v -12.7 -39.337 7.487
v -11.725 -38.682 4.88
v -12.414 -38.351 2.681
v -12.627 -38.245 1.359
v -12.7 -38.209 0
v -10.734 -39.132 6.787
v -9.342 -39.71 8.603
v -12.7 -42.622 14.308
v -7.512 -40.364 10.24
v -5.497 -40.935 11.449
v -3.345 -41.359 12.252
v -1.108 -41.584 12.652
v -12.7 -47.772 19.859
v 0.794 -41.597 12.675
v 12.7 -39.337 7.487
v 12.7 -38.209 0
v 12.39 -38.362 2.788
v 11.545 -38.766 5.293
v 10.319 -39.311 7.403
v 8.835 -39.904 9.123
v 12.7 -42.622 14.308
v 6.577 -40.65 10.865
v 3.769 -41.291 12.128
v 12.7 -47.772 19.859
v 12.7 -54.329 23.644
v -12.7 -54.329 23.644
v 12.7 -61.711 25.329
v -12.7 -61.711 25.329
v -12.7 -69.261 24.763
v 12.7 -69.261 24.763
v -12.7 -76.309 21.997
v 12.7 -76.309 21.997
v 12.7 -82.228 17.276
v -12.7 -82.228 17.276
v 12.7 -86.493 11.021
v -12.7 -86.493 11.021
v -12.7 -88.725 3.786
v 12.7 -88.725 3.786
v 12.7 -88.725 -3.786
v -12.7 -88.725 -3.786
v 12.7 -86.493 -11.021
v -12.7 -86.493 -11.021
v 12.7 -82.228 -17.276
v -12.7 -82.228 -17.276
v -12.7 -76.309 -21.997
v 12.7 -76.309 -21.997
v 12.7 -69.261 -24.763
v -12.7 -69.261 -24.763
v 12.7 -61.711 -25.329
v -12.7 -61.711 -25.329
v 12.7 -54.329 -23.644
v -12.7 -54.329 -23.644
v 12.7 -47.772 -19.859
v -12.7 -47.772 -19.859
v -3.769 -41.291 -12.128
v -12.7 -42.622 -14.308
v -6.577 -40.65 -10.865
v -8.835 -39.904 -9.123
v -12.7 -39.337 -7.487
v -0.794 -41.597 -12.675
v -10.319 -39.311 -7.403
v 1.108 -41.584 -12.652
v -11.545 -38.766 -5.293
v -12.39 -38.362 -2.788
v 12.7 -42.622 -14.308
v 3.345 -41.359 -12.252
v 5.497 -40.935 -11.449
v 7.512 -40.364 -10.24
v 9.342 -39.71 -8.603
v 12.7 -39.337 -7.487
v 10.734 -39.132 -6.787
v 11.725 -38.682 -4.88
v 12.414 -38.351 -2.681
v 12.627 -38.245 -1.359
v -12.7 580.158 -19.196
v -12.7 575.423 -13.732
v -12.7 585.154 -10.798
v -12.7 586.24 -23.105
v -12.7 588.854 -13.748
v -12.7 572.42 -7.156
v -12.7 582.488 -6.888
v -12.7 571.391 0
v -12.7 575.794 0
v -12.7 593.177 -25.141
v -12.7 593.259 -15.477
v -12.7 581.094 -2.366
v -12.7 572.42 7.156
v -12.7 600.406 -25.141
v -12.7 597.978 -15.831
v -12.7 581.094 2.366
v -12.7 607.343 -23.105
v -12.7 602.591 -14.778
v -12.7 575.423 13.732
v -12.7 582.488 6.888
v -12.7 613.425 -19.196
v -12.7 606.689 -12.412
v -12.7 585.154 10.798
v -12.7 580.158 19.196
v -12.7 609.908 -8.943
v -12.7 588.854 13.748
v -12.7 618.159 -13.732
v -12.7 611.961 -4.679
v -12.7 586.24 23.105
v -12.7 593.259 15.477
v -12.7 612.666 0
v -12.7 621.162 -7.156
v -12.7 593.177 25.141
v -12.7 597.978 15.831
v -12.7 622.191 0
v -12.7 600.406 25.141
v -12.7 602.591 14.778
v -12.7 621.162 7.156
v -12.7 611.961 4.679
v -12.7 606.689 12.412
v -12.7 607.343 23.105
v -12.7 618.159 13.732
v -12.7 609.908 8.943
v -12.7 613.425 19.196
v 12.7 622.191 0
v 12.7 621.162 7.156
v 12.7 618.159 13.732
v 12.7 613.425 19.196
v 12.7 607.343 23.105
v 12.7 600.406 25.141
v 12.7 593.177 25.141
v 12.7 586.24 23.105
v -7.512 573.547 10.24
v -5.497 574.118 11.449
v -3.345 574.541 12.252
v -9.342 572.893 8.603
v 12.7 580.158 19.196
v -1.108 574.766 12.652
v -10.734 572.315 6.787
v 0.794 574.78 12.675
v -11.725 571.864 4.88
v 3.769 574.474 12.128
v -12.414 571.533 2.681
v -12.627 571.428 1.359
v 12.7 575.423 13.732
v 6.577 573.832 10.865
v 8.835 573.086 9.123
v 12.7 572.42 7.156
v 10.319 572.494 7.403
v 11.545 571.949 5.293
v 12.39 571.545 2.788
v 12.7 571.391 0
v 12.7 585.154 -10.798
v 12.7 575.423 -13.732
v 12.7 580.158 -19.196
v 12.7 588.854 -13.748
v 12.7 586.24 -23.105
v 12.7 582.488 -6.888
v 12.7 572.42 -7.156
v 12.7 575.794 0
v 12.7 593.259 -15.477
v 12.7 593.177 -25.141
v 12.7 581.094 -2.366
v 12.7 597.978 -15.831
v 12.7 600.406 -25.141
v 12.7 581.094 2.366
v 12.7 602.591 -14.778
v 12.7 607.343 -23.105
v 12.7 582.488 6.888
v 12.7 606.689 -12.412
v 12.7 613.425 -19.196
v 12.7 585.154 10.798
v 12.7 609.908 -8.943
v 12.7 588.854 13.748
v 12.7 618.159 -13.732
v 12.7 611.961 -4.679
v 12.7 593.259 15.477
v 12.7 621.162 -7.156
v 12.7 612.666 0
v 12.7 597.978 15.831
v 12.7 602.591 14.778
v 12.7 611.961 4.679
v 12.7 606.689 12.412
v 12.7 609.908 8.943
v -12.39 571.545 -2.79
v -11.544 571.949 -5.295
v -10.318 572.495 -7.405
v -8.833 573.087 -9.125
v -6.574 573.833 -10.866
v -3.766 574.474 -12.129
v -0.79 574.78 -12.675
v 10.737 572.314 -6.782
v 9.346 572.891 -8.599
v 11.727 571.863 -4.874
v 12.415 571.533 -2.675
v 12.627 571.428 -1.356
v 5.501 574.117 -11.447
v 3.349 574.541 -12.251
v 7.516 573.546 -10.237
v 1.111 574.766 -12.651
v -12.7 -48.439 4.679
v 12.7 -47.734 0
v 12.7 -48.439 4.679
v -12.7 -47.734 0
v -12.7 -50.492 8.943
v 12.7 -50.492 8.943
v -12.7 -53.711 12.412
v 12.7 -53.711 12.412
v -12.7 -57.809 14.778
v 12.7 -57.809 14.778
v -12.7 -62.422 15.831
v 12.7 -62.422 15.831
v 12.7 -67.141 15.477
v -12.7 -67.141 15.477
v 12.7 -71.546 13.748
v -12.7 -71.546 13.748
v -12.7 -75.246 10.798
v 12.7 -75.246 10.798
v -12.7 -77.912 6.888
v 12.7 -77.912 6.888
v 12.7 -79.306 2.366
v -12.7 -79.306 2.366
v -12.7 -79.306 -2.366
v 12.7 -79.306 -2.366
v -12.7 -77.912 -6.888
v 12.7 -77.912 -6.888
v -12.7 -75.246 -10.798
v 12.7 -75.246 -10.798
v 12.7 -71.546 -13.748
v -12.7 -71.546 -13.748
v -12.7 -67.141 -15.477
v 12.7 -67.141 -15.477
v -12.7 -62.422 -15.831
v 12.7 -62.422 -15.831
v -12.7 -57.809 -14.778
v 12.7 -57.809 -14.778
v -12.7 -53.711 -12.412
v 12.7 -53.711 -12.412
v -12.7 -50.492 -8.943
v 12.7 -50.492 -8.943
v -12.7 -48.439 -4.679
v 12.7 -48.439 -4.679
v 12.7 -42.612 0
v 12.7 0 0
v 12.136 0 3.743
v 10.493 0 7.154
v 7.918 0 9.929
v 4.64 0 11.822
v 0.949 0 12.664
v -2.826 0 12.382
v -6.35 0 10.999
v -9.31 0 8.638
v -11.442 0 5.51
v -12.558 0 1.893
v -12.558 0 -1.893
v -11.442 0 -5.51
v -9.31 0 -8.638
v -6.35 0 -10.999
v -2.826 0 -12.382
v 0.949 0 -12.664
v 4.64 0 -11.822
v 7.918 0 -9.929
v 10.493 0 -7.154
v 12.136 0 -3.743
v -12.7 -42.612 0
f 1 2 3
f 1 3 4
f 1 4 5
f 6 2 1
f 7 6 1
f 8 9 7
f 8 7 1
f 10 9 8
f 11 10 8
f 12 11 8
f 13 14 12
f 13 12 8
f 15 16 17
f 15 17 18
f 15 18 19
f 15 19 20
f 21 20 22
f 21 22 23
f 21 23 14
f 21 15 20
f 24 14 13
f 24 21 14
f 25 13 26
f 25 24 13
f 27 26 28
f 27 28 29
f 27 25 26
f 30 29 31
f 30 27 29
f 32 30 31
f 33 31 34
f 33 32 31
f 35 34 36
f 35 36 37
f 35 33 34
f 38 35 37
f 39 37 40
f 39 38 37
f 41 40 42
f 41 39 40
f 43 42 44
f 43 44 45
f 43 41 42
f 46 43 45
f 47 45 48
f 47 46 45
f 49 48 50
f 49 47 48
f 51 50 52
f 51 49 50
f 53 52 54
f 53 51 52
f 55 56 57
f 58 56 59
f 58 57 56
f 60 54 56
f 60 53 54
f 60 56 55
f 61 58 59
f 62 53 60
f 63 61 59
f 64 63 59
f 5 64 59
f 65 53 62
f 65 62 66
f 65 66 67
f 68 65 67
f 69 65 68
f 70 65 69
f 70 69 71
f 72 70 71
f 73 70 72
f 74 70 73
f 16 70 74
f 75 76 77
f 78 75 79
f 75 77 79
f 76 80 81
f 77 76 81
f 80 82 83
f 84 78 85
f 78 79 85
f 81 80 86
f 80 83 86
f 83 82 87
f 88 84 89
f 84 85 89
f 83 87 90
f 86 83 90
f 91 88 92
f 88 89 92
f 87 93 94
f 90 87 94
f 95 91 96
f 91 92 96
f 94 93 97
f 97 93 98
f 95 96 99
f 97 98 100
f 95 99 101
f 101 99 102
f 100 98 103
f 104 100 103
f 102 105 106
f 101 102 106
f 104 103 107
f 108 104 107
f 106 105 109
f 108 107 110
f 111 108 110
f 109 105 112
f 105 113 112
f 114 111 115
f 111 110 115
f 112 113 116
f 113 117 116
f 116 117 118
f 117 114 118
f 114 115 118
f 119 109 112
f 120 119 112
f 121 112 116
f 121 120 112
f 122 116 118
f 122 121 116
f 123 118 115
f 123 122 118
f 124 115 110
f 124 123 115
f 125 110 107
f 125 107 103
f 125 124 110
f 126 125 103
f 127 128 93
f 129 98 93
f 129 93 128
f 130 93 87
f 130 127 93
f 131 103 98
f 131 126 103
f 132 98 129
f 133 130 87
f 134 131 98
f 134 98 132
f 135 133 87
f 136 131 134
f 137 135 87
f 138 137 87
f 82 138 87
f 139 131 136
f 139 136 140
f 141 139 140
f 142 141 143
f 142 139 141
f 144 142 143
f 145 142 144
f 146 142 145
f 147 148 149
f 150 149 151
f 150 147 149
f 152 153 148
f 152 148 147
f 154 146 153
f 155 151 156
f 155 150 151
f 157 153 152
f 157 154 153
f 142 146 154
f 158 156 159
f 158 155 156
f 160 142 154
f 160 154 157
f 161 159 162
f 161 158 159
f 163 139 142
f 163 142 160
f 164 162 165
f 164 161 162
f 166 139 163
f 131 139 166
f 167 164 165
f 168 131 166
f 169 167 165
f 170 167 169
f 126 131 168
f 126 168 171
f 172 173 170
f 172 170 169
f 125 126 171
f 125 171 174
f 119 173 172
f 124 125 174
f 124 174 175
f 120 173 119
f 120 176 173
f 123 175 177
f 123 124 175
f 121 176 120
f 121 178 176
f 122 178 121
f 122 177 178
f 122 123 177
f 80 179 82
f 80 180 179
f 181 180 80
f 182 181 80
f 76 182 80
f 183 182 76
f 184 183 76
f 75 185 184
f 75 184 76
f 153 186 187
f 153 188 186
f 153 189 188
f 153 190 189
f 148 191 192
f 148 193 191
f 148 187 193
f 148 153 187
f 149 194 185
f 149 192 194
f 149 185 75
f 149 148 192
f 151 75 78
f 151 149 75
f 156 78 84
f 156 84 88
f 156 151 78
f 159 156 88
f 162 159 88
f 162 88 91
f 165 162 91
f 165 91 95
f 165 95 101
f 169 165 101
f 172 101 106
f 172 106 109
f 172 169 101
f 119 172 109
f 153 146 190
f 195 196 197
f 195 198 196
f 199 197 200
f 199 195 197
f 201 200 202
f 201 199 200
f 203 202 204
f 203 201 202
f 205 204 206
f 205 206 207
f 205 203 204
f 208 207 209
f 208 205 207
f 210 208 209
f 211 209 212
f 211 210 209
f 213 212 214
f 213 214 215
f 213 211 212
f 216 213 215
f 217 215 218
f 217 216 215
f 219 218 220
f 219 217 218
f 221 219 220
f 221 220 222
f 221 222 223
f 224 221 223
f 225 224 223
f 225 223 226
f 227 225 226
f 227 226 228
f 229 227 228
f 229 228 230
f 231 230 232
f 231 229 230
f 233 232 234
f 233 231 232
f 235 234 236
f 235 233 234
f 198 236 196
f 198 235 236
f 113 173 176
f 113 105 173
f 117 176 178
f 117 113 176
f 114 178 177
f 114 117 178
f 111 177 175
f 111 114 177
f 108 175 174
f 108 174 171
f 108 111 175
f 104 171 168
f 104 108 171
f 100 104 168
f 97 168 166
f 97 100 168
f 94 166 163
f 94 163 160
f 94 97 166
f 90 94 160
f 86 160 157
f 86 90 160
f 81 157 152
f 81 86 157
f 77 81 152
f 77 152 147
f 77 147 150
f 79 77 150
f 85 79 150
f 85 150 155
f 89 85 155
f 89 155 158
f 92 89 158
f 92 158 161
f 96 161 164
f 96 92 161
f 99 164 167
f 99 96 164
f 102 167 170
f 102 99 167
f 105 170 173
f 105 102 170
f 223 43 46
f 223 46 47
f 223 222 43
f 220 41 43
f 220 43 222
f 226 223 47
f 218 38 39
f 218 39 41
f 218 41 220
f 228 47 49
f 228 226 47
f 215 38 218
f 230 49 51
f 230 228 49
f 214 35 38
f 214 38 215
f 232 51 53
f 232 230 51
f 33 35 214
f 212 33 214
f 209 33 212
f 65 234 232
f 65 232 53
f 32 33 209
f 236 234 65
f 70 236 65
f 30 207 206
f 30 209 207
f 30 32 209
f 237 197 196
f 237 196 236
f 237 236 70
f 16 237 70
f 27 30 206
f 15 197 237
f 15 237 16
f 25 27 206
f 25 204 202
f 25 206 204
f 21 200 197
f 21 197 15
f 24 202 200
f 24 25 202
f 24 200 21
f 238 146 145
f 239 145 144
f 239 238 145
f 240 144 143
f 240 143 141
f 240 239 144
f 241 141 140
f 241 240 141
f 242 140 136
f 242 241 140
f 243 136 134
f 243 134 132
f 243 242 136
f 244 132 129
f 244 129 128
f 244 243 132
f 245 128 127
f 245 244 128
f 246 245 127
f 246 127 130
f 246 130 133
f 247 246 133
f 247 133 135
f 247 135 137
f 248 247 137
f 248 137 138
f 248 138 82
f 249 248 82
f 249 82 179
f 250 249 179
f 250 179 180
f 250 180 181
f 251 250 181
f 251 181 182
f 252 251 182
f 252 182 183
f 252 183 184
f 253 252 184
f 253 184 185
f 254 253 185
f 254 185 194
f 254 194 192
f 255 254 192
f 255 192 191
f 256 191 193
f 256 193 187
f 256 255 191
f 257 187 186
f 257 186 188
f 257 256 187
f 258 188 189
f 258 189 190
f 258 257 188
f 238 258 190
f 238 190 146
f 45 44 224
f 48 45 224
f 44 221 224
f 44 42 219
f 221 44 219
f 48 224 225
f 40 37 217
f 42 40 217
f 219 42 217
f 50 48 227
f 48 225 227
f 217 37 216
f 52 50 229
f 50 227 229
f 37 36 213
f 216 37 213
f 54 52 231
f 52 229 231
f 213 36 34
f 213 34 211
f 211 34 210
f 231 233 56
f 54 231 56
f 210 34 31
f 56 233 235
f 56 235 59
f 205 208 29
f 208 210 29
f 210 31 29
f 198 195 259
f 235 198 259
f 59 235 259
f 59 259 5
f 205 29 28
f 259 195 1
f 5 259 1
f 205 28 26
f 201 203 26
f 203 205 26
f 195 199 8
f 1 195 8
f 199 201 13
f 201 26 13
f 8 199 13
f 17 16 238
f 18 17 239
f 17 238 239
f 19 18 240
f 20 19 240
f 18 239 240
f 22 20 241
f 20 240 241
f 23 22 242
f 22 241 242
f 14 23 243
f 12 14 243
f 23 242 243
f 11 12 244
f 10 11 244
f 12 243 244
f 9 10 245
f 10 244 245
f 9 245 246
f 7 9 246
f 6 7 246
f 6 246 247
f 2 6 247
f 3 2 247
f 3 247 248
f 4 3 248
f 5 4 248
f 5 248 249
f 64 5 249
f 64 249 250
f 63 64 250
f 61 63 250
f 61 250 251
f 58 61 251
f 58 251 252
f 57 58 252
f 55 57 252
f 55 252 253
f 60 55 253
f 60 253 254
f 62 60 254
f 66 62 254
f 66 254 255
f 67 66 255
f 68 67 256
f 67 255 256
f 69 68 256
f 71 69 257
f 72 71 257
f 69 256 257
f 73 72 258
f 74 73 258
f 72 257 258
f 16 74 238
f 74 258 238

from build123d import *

# Parameters (mm, degrees)
F0_R          = 25.4
F0_R_2        = 15.875
F2_DEPTH      = 12.7
F3_DEPTH      = 12.7
F1_R          = 12.7
F4_DEPTH      = 42.6116161379
F4_DEPTH_BACK = 575.7942935499


with BuildPart() as f2:
    # F0 (on Right) → F2 (new body, symmetric)
    with BuildSketch(Plane.YZ):
        with Locations((-63.608661294, 0)):
            Circle(F0_R)
        with Locations((-63.608661294, 0)):
            Circle(F0_R_2, mode=Mode.SUBTRACT)
    extrude(amount=F2_DEPTH, both=True)



with BuildPart() as f3:
    # F0 (on Right) → F3 (new body, symmetric)
    with BuildSketch(Plane.YZ):
        with Locations((596.791338706, 0)):
            Circle(F0_R)
        with Locations((596.791338706, 0)):
            Circle(F0_R_2, mode=Mode.SUBTRACT)
    extrude(amount=F3_DEPTH, both=True)


with BuildPart() as f2_1:
    add(f2.part)

    add(f3.part)  # F4 merges F3
    # F1 (on Front) → F4 (join, two sides)
    with BuildSketch(Plane.XZ) as f4_sk:
        Circle(F1_R)
    extrude(amount=F4_DEPTH)
    extrude(f4_sk.sketch, amount=-F4_DEPTH_BACK)


solid = f2_1.part
